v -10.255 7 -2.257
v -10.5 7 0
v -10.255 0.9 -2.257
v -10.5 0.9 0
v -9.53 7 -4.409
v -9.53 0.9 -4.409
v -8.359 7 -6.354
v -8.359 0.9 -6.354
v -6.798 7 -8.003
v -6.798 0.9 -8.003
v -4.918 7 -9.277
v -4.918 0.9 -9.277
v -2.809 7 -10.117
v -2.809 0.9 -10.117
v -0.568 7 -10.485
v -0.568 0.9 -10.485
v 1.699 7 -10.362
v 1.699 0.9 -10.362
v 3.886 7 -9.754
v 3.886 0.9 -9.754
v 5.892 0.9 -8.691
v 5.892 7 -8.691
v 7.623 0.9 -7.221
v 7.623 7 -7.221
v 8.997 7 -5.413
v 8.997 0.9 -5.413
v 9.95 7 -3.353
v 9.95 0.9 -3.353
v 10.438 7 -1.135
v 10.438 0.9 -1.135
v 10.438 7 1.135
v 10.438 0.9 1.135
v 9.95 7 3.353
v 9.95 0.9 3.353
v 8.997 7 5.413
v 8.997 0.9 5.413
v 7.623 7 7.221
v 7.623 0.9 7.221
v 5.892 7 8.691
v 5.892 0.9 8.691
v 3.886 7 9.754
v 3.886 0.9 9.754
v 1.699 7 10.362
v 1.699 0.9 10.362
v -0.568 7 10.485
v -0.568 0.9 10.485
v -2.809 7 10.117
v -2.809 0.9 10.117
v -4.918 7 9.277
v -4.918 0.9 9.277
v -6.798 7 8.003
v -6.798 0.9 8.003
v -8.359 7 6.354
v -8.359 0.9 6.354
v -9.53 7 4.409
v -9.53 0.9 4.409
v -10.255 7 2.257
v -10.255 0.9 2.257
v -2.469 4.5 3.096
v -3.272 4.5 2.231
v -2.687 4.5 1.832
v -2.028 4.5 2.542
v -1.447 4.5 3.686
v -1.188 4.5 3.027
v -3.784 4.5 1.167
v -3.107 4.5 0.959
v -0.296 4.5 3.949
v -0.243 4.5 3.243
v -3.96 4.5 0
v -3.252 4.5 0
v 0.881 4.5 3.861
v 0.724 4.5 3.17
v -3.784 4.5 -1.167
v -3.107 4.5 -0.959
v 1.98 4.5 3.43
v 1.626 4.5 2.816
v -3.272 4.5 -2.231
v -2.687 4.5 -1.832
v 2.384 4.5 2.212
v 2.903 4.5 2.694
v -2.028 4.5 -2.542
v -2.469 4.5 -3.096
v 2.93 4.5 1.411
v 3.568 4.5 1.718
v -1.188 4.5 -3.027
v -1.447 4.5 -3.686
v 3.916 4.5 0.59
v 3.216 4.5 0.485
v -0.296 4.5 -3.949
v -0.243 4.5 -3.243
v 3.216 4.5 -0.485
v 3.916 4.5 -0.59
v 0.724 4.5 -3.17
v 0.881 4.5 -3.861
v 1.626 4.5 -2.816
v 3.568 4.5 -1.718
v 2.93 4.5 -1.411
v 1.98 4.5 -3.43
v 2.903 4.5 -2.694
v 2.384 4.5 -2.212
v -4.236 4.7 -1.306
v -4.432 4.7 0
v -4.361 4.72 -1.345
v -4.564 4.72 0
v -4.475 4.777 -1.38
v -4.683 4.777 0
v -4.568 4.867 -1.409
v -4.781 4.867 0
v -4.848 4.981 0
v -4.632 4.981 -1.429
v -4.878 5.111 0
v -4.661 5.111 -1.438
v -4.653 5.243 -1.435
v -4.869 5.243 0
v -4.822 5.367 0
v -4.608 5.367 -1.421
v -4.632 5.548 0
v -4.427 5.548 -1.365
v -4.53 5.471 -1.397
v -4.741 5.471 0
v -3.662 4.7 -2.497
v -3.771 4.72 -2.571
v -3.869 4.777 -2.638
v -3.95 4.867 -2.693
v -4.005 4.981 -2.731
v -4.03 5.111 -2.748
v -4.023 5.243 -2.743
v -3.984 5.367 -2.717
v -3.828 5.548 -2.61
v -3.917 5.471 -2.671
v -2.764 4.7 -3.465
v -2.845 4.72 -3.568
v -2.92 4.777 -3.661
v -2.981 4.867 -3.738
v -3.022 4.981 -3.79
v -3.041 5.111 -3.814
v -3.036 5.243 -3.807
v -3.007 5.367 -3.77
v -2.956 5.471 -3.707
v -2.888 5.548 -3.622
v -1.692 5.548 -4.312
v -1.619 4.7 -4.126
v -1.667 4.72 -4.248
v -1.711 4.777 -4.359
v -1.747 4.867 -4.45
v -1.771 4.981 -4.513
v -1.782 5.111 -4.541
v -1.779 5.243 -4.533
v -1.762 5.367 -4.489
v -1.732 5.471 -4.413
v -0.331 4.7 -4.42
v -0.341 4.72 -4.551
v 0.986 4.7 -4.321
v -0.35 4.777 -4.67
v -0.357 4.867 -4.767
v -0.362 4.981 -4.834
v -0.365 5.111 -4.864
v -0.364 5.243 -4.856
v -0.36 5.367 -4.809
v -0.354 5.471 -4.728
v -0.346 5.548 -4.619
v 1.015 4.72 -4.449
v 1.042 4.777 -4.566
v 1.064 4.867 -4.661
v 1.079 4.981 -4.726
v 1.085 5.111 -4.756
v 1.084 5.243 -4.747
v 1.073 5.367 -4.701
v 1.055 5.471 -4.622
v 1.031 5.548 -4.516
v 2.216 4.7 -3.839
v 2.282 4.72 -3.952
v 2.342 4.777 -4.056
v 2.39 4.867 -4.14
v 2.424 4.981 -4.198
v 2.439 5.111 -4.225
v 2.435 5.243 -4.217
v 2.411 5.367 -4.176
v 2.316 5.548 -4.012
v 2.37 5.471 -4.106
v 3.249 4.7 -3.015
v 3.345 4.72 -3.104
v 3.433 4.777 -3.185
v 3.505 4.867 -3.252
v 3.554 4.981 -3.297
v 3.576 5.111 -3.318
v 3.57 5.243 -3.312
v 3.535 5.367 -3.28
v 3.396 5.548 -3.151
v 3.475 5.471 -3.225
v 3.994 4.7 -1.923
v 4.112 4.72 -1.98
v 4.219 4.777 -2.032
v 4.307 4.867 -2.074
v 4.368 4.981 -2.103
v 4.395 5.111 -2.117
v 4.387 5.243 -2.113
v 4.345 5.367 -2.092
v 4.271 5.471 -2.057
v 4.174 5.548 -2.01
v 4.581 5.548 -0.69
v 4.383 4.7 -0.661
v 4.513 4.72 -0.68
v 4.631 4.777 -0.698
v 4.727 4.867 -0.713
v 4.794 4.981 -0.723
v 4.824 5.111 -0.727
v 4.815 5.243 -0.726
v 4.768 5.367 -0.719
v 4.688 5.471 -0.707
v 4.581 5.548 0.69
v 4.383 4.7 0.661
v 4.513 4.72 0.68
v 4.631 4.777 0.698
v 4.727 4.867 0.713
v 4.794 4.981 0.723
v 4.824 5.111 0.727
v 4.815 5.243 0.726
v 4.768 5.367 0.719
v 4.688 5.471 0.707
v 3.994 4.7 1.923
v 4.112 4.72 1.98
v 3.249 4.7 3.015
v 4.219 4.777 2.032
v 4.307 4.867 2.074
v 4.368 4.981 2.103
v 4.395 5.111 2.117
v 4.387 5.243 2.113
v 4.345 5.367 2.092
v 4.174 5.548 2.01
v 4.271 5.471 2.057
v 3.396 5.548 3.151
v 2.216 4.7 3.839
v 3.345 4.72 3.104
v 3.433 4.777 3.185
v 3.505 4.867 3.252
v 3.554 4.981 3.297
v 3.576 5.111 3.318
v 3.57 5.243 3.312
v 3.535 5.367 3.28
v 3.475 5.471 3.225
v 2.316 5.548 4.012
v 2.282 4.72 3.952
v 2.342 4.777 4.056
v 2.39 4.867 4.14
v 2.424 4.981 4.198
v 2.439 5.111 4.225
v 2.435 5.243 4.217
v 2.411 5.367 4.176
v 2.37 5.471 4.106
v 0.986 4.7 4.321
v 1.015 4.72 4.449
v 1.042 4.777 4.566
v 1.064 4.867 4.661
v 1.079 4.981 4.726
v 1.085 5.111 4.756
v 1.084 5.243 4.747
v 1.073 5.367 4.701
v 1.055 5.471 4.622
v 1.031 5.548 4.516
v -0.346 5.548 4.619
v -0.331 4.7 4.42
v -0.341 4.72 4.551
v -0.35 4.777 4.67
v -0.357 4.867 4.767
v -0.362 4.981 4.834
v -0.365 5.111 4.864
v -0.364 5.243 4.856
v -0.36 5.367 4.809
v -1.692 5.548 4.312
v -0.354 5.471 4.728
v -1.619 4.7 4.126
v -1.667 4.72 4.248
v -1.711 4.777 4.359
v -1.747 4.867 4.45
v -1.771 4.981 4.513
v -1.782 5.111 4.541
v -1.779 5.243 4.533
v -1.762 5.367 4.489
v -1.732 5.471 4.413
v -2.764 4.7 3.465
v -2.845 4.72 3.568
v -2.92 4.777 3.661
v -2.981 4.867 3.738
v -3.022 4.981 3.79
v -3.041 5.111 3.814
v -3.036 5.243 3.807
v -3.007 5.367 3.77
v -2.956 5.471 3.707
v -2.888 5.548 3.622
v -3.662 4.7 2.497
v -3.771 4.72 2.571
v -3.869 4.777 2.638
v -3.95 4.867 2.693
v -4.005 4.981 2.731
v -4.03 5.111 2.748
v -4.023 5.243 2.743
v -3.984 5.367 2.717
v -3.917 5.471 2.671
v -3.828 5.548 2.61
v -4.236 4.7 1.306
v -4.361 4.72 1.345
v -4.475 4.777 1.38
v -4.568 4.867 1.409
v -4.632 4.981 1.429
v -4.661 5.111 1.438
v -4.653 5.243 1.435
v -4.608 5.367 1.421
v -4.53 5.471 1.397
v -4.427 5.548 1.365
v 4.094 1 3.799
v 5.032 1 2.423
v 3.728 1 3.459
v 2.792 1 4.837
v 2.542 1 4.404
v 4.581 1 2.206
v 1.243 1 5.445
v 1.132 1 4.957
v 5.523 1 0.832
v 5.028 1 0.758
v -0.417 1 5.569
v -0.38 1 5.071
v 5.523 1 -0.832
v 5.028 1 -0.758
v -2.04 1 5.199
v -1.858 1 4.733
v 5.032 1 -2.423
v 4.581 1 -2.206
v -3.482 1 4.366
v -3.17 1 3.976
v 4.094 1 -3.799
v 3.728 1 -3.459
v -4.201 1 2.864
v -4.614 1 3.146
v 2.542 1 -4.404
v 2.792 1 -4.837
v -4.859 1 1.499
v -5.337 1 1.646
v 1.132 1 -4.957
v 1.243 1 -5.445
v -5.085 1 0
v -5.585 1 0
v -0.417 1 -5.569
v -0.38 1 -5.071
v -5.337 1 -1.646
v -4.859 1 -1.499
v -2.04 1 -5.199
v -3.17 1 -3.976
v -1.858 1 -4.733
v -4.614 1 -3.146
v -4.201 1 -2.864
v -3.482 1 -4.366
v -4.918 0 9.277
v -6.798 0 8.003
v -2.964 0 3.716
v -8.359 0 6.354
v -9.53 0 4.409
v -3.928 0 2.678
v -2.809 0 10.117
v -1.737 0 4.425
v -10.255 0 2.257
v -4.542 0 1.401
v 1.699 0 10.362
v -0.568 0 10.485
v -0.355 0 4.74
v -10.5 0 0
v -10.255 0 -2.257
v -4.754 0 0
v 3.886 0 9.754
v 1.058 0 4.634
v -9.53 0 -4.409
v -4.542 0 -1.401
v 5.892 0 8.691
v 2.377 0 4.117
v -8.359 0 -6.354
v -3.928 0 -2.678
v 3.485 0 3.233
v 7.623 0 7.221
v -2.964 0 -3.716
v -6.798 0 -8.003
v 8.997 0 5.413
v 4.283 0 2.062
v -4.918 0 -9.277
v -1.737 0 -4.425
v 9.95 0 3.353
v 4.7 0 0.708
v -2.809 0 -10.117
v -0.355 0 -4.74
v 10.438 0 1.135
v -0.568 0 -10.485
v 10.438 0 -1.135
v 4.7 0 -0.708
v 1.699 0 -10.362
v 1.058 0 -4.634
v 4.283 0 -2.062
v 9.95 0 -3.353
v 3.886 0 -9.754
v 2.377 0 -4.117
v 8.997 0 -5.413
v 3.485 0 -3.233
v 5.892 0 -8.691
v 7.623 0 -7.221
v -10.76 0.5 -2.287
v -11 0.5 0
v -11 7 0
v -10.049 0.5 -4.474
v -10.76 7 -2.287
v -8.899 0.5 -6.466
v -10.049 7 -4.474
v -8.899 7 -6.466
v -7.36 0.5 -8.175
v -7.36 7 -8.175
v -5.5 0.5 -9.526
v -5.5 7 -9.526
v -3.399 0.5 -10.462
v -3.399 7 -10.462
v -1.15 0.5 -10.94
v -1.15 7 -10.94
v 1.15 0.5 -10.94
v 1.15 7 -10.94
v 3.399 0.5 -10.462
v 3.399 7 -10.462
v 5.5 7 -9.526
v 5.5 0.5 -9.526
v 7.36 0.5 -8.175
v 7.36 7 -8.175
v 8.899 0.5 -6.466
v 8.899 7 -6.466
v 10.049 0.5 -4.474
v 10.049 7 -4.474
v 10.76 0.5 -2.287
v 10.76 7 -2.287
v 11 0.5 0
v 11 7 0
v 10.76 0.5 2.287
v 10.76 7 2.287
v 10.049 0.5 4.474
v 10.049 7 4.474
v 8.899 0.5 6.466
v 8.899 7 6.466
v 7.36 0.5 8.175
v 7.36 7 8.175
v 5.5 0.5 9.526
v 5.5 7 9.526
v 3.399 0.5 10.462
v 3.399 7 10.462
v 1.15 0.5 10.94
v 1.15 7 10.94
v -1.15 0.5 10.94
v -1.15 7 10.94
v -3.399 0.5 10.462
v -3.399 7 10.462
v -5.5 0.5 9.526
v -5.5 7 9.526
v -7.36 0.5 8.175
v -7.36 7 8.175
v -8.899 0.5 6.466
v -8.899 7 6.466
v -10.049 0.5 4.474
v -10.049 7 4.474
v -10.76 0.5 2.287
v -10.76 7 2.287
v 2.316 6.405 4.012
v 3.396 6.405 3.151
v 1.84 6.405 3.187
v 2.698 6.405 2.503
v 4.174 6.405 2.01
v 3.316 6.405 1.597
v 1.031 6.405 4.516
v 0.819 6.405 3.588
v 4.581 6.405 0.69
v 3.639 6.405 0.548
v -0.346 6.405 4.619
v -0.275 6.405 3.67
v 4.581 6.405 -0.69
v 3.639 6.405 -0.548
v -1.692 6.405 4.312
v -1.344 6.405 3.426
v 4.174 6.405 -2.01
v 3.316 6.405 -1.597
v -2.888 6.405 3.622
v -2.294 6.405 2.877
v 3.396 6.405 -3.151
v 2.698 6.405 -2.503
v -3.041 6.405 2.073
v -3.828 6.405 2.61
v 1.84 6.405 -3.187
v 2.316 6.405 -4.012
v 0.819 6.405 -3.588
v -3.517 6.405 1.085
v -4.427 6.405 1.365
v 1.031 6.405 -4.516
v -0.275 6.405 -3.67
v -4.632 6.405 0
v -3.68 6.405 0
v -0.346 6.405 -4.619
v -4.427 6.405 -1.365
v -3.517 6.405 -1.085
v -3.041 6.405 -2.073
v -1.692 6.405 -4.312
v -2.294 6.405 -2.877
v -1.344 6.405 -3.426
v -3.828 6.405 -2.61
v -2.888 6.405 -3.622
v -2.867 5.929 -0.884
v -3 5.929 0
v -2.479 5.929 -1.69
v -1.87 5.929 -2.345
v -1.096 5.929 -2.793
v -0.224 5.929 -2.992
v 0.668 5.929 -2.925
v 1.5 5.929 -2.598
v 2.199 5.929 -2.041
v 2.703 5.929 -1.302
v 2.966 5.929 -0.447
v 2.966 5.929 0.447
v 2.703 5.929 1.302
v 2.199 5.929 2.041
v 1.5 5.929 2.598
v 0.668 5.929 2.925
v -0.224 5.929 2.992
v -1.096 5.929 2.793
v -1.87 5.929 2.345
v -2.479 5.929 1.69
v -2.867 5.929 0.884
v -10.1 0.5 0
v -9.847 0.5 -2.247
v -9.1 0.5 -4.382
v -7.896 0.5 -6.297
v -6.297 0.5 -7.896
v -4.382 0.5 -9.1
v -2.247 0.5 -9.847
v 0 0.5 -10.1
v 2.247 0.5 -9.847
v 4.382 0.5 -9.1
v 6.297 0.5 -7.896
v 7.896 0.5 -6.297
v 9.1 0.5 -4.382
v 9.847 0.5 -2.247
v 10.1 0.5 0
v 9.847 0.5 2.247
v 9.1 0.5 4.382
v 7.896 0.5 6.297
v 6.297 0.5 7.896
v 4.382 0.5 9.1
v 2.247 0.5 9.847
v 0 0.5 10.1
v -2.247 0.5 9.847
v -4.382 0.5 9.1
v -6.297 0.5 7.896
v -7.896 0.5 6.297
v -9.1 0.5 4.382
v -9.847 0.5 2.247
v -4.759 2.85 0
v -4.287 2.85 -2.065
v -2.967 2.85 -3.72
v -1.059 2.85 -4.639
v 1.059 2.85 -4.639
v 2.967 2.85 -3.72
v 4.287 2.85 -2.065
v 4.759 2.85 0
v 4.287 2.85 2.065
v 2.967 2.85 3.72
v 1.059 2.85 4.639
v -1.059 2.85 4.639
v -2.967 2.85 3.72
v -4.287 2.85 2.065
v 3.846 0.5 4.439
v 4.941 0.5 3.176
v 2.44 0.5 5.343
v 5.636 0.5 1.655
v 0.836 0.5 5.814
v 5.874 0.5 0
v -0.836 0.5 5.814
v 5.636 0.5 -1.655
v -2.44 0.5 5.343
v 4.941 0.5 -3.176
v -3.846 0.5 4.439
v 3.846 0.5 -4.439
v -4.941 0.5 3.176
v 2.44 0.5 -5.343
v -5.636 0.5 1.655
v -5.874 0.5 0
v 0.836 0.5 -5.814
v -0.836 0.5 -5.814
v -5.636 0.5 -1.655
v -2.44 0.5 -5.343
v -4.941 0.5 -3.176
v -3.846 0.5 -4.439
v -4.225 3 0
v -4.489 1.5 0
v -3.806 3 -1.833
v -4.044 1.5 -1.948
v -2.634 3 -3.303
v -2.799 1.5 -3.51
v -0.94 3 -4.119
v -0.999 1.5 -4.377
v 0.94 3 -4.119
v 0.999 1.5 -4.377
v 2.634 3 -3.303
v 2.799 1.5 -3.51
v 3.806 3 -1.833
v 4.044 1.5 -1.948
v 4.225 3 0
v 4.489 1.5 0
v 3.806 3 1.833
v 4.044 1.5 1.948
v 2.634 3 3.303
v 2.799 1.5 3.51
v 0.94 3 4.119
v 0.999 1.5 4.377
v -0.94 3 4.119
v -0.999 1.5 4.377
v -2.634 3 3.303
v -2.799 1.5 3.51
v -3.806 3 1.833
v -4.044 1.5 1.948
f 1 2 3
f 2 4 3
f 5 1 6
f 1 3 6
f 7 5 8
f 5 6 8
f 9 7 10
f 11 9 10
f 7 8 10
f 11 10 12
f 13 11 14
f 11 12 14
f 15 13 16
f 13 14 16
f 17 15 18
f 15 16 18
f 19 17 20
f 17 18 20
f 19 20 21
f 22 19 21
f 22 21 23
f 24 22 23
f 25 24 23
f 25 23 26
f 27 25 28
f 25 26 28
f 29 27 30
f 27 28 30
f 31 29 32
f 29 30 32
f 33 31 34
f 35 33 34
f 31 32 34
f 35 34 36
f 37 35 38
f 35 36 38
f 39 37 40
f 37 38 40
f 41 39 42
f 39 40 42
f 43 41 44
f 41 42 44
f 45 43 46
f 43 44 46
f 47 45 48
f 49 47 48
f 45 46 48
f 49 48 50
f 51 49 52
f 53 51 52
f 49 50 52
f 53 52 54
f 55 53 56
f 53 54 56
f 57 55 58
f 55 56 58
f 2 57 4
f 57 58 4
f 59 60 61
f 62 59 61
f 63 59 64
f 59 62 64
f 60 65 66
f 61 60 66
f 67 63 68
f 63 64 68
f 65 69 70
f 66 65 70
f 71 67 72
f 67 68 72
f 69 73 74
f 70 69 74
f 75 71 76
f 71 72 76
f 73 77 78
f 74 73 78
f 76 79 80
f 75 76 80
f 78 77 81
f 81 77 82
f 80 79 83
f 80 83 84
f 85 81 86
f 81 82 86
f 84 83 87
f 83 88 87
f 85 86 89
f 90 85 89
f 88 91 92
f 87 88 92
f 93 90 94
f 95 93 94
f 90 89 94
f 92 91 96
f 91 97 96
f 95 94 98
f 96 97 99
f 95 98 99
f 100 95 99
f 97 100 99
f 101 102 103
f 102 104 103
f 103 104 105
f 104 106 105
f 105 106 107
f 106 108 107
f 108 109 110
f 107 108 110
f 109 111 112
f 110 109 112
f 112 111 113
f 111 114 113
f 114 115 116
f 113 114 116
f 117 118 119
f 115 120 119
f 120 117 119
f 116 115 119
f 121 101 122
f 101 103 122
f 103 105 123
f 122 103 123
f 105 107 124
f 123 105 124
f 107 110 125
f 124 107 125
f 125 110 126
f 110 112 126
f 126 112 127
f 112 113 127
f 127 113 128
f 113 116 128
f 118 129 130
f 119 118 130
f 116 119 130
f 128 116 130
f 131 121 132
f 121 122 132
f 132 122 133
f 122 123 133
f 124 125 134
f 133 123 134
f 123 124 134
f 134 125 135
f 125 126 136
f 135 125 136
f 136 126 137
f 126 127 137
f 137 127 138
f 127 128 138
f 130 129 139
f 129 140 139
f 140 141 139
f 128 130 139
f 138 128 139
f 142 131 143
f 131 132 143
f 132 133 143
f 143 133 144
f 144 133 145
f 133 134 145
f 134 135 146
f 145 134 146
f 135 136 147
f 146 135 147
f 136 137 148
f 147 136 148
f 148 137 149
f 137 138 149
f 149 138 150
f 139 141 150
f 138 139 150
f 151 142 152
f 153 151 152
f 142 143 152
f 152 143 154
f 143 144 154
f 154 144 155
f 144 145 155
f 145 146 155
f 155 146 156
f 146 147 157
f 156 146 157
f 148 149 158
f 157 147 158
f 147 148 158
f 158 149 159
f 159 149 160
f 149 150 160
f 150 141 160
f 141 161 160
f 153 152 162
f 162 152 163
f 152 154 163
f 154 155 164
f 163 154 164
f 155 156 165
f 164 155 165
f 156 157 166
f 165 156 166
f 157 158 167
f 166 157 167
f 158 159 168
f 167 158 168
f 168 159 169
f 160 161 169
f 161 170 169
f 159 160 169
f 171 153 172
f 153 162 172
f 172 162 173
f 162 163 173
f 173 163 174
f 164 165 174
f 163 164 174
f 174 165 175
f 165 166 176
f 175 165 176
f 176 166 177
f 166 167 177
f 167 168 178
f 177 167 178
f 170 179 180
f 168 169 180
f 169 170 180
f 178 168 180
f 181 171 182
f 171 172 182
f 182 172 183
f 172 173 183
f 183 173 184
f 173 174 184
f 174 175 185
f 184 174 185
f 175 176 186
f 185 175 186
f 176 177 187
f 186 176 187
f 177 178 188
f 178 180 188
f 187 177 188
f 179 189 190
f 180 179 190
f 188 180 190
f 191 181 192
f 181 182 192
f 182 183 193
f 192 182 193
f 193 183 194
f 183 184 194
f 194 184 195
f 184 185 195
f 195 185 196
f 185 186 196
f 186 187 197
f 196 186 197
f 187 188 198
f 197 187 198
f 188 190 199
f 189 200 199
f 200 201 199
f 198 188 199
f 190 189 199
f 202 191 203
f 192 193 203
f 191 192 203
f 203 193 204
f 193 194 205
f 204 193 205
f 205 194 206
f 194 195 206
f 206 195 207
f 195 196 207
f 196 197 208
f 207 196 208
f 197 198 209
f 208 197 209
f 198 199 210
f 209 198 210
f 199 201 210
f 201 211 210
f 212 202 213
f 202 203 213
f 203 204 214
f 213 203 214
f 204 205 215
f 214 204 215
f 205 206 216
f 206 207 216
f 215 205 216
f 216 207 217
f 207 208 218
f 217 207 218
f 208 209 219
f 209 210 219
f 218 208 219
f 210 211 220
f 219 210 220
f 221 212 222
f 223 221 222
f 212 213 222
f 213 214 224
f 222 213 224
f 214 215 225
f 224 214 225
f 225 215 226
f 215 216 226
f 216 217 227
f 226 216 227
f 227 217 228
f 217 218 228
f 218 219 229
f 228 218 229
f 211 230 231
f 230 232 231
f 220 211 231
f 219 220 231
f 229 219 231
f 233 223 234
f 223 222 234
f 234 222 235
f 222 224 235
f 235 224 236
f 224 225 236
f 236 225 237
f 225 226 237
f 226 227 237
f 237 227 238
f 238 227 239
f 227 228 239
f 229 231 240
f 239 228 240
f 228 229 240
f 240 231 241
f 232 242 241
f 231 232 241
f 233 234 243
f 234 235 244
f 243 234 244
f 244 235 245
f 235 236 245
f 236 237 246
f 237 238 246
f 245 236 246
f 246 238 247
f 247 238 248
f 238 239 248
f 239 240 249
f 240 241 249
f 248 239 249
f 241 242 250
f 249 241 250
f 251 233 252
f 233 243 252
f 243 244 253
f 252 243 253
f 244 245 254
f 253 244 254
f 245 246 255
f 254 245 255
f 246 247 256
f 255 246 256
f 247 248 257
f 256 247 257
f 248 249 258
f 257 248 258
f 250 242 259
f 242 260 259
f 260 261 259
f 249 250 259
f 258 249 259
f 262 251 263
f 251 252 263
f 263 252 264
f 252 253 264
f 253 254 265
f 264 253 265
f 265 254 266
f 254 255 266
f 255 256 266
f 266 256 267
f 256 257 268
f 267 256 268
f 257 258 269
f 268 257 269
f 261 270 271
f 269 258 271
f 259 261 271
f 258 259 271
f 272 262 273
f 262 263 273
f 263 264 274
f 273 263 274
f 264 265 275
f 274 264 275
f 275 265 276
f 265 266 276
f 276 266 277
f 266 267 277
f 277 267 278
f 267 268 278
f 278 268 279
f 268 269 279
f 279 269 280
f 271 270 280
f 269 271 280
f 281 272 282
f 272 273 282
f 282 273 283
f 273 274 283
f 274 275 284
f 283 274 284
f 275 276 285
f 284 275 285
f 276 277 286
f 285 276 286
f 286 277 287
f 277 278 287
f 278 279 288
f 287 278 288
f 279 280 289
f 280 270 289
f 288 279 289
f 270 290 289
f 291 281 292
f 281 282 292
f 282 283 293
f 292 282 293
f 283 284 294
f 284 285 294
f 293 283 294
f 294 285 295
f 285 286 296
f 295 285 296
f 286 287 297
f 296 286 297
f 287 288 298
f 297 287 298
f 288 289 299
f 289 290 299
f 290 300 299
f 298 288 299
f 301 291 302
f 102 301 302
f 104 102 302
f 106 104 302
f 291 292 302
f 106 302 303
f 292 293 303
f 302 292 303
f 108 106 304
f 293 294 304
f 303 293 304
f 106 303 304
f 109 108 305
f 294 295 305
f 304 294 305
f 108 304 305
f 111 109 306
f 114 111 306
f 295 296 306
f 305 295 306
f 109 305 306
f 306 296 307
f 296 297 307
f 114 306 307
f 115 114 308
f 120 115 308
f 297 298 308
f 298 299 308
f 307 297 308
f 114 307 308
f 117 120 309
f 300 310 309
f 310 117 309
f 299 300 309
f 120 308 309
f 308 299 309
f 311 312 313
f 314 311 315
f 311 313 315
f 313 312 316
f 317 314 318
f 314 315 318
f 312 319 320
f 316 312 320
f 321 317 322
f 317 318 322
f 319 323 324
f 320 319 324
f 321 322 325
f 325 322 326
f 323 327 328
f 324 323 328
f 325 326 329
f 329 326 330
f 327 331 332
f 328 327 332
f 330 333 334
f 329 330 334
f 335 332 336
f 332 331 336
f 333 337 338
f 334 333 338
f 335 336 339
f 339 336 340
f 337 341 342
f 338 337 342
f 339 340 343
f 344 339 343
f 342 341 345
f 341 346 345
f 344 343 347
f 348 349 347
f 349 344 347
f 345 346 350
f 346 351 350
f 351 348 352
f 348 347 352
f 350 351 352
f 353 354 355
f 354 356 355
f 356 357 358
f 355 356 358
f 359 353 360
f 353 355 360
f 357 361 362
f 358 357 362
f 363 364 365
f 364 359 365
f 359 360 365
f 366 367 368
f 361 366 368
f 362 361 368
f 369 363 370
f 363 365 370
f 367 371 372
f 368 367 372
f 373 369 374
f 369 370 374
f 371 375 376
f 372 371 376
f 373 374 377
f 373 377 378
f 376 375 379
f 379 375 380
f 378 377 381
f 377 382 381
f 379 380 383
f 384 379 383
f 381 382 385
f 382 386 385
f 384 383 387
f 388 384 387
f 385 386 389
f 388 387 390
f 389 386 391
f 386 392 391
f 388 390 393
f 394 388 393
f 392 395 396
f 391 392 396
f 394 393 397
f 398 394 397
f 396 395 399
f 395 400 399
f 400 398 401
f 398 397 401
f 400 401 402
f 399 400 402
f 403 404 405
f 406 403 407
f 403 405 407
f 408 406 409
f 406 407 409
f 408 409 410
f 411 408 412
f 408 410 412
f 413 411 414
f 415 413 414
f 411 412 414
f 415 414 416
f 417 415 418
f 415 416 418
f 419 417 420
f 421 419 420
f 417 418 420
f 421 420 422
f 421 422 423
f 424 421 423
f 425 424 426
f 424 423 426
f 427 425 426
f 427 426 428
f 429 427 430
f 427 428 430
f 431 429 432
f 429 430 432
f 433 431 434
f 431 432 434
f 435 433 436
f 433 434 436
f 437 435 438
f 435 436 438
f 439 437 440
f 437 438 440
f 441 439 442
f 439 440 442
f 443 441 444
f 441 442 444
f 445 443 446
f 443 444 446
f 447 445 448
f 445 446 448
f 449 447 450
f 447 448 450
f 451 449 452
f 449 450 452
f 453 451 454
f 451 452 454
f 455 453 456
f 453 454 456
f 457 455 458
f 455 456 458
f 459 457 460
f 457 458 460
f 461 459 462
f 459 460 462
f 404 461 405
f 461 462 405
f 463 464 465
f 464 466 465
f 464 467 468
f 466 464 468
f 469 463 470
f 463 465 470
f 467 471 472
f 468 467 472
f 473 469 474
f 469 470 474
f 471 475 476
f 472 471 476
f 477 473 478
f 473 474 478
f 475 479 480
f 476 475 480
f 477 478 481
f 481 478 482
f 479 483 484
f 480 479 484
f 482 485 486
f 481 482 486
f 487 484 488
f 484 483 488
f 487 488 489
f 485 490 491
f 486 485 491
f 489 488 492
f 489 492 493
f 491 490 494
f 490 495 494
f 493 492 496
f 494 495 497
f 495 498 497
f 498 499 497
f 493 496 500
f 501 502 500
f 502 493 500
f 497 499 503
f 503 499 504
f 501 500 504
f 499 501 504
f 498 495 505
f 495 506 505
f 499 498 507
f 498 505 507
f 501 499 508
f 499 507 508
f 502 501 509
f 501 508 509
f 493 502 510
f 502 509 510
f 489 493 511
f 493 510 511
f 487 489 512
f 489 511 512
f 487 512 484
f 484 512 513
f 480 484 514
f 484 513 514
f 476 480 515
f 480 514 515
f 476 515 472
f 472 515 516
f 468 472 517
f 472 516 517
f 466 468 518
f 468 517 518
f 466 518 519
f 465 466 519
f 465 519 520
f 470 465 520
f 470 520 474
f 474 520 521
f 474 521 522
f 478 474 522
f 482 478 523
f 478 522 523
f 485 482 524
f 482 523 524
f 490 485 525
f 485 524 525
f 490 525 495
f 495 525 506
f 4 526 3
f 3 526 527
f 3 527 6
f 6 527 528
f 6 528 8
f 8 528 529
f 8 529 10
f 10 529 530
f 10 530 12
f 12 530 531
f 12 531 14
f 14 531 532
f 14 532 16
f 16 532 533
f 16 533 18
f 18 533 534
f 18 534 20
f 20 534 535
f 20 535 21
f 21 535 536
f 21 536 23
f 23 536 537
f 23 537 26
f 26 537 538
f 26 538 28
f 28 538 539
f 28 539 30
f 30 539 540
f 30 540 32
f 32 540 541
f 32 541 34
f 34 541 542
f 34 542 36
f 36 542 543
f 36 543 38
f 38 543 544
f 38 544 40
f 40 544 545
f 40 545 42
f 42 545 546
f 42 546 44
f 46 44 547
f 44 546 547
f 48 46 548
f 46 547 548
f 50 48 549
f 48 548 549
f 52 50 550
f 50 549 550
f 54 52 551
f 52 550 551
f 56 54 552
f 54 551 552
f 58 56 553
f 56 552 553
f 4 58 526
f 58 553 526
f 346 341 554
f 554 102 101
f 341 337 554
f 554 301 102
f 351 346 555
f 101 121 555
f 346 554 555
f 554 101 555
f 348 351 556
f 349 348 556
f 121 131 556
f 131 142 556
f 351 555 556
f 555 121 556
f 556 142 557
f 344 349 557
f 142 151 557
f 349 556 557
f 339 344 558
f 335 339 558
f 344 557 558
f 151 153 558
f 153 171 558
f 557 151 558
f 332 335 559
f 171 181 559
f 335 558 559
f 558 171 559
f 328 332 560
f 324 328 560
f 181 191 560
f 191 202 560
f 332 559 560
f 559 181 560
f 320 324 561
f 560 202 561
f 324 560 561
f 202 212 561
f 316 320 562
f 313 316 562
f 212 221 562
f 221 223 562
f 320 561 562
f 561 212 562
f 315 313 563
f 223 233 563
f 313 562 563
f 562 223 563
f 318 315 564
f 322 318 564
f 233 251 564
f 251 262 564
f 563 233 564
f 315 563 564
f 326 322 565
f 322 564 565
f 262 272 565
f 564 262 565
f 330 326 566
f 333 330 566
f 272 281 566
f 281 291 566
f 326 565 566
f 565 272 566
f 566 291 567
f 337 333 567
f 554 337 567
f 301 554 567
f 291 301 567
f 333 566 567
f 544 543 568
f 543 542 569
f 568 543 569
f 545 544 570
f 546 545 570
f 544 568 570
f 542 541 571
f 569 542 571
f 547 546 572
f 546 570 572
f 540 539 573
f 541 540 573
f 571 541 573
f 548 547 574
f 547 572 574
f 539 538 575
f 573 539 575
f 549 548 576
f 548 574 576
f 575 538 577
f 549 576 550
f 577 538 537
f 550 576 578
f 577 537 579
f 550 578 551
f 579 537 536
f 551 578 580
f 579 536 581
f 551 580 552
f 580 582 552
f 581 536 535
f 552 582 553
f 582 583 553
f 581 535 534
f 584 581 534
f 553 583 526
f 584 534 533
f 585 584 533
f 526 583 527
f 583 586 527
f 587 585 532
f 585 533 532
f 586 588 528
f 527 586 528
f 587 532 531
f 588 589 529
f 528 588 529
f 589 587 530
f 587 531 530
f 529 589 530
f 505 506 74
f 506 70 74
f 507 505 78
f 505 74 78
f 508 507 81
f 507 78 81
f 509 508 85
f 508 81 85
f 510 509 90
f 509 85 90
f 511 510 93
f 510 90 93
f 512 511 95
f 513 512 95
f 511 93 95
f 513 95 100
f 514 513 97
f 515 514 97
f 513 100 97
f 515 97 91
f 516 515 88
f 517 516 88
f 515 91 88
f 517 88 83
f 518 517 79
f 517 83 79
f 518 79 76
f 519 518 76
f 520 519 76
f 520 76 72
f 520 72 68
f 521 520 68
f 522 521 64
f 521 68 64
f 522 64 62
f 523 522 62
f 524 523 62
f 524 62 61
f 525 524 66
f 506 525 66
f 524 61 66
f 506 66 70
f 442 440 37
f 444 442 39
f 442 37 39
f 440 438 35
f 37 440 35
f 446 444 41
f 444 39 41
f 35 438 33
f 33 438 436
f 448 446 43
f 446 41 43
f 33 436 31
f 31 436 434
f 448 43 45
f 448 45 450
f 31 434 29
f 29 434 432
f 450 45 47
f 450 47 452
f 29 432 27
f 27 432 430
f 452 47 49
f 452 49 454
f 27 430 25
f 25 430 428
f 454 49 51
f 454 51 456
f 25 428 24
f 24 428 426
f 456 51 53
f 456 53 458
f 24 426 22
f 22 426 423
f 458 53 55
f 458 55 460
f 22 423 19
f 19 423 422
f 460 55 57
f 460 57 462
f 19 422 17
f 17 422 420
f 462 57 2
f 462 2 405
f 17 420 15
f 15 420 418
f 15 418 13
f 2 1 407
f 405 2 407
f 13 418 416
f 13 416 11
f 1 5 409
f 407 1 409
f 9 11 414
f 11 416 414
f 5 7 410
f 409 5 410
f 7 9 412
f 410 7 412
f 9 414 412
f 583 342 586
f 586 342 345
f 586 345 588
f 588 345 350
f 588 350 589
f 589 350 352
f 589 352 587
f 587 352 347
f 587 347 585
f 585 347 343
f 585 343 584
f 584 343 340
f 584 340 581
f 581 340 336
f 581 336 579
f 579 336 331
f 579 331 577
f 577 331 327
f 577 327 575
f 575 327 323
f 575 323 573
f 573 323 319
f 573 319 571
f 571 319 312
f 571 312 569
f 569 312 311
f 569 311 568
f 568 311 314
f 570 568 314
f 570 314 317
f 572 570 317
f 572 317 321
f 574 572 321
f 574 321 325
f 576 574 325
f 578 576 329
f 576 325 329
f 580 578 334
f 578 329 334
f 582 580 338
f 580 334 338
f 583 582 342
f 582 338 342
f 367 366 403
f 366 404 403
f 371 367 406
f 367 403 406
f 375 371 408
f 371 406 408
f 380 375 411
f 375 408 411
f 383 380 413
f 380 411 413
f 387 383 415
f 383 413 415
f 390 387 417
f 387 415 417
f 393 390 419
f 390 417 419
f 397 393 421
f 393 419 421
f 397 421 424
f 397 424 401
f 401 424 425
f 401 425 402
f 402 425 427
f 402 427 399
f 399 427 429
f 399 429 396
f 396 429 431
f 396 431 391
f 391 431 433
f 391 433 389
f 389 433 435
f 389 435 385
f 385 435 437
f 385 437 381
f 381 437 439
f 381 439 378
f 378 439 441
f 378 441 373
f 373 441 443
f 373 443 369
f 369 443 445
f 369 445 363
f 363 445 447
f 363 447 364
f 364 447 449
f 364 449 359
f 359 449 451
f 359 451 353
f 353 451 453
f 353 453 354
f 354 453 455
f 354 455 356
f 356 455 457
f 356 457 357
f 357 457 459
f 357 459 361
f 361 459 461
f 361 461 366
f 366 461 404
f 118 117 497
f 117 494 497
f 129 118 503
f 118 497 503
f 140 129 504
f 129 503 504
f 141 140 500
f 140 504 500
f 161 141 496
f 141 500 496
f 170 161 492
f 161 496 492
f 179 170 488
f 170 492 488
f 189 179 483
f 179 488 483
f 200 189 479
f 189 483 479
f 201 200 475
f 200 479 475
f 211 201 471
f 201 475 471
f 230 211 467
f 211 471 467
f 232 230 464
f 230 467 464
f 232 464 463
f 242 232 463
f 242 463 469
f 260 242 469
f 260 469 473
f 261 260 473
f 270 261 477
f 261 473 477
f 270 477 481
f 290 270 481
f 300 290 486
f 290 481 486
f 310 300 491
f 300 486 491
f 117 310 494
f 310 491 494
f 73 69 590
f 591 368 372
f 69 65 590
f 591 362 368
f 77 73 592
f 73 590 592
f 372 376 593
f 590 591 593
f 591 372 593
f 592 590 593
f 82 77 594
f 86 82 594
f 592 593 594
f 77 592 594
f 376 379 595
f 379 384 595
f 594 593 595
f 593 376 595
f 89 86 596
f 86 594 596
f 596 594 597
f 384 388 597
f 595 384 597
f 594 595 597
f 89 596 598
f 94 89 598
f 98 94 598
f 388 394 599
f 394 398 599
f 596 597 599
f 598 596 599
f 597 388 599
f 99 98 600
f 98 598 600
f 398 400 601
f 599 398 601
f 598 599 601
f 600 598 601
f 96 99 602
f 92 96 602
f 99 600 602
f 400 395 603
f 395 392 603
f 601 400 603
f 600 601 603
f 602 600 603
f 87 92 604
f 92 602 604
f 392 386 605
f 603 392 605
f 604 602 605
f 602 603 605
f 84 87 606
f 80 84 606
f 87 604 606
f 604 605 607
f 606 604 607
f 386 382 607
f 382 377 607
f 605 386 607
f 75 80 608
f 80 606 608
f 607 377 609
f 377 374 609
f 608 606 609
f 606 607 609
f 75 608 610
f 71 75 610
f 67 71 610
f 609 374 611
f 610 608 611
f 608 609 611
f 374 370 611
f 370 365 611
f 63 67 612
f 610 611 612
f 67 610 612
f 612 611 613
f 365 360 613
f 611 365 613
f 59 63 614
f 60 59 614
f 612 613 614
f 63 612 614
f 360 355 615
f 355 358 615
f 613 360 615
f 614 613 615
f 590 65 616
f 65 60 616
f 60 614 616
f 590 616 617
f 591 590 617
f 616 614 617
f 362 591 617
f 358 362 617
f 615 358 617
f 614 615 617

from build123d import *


with BuildPart() as part:
    # 草图1 → 旋转1 (revolve)
    with BuildSketch(Plane.XY):
        with BuildLine():
            Line((-10.1, 0.5), (-5.873607887, 0.5))
            Line((-5.873607887, 0.5), (-5.584932753, 1))
            Line((-5.584932753, 1), (-5.084932753, 1))
            Line((-5.084932753, 1), (-4.432451432, 4.700405452))
            ThreePointArc((-4.432451432, 4.700405452), (-4.867701612, 5.044870418), (-4.632451432, 5.547619048))
            Line((-4.632451432, 5.547619048), (-4.632451432, 6.404761905))
            Line((-4.632451432, 6.404761905), (-3.680070479, 6.404761905))
            Line((-3.680070479, 6.404761905), (-3, 5.928571429))
            Line((-3, 5.928571429), (-3.251895687, 4.5))
            Line((-3.251895687, 4.5), (-3.960075014, 4.5))
            Line((-3.960075014, 4.5), (-4.753546427, 0))
            Line((-4.753546427, 0), (-10.5, 0))
            Line((-10.5, 0), (-11, 0.5))
            Line((-11, 0.5), (-11, 7))
            Line((-11, 7), (-10.5, 7))
            Line((-10.5, 7), (-10.5, 0.9))
            Line((-10.5, 0.9), (-10.1, 0.5))
        make_face()
    revolve(axis=Axis((0, 5.836193369, 0), (0, -1, 0)))


solid = part.part
